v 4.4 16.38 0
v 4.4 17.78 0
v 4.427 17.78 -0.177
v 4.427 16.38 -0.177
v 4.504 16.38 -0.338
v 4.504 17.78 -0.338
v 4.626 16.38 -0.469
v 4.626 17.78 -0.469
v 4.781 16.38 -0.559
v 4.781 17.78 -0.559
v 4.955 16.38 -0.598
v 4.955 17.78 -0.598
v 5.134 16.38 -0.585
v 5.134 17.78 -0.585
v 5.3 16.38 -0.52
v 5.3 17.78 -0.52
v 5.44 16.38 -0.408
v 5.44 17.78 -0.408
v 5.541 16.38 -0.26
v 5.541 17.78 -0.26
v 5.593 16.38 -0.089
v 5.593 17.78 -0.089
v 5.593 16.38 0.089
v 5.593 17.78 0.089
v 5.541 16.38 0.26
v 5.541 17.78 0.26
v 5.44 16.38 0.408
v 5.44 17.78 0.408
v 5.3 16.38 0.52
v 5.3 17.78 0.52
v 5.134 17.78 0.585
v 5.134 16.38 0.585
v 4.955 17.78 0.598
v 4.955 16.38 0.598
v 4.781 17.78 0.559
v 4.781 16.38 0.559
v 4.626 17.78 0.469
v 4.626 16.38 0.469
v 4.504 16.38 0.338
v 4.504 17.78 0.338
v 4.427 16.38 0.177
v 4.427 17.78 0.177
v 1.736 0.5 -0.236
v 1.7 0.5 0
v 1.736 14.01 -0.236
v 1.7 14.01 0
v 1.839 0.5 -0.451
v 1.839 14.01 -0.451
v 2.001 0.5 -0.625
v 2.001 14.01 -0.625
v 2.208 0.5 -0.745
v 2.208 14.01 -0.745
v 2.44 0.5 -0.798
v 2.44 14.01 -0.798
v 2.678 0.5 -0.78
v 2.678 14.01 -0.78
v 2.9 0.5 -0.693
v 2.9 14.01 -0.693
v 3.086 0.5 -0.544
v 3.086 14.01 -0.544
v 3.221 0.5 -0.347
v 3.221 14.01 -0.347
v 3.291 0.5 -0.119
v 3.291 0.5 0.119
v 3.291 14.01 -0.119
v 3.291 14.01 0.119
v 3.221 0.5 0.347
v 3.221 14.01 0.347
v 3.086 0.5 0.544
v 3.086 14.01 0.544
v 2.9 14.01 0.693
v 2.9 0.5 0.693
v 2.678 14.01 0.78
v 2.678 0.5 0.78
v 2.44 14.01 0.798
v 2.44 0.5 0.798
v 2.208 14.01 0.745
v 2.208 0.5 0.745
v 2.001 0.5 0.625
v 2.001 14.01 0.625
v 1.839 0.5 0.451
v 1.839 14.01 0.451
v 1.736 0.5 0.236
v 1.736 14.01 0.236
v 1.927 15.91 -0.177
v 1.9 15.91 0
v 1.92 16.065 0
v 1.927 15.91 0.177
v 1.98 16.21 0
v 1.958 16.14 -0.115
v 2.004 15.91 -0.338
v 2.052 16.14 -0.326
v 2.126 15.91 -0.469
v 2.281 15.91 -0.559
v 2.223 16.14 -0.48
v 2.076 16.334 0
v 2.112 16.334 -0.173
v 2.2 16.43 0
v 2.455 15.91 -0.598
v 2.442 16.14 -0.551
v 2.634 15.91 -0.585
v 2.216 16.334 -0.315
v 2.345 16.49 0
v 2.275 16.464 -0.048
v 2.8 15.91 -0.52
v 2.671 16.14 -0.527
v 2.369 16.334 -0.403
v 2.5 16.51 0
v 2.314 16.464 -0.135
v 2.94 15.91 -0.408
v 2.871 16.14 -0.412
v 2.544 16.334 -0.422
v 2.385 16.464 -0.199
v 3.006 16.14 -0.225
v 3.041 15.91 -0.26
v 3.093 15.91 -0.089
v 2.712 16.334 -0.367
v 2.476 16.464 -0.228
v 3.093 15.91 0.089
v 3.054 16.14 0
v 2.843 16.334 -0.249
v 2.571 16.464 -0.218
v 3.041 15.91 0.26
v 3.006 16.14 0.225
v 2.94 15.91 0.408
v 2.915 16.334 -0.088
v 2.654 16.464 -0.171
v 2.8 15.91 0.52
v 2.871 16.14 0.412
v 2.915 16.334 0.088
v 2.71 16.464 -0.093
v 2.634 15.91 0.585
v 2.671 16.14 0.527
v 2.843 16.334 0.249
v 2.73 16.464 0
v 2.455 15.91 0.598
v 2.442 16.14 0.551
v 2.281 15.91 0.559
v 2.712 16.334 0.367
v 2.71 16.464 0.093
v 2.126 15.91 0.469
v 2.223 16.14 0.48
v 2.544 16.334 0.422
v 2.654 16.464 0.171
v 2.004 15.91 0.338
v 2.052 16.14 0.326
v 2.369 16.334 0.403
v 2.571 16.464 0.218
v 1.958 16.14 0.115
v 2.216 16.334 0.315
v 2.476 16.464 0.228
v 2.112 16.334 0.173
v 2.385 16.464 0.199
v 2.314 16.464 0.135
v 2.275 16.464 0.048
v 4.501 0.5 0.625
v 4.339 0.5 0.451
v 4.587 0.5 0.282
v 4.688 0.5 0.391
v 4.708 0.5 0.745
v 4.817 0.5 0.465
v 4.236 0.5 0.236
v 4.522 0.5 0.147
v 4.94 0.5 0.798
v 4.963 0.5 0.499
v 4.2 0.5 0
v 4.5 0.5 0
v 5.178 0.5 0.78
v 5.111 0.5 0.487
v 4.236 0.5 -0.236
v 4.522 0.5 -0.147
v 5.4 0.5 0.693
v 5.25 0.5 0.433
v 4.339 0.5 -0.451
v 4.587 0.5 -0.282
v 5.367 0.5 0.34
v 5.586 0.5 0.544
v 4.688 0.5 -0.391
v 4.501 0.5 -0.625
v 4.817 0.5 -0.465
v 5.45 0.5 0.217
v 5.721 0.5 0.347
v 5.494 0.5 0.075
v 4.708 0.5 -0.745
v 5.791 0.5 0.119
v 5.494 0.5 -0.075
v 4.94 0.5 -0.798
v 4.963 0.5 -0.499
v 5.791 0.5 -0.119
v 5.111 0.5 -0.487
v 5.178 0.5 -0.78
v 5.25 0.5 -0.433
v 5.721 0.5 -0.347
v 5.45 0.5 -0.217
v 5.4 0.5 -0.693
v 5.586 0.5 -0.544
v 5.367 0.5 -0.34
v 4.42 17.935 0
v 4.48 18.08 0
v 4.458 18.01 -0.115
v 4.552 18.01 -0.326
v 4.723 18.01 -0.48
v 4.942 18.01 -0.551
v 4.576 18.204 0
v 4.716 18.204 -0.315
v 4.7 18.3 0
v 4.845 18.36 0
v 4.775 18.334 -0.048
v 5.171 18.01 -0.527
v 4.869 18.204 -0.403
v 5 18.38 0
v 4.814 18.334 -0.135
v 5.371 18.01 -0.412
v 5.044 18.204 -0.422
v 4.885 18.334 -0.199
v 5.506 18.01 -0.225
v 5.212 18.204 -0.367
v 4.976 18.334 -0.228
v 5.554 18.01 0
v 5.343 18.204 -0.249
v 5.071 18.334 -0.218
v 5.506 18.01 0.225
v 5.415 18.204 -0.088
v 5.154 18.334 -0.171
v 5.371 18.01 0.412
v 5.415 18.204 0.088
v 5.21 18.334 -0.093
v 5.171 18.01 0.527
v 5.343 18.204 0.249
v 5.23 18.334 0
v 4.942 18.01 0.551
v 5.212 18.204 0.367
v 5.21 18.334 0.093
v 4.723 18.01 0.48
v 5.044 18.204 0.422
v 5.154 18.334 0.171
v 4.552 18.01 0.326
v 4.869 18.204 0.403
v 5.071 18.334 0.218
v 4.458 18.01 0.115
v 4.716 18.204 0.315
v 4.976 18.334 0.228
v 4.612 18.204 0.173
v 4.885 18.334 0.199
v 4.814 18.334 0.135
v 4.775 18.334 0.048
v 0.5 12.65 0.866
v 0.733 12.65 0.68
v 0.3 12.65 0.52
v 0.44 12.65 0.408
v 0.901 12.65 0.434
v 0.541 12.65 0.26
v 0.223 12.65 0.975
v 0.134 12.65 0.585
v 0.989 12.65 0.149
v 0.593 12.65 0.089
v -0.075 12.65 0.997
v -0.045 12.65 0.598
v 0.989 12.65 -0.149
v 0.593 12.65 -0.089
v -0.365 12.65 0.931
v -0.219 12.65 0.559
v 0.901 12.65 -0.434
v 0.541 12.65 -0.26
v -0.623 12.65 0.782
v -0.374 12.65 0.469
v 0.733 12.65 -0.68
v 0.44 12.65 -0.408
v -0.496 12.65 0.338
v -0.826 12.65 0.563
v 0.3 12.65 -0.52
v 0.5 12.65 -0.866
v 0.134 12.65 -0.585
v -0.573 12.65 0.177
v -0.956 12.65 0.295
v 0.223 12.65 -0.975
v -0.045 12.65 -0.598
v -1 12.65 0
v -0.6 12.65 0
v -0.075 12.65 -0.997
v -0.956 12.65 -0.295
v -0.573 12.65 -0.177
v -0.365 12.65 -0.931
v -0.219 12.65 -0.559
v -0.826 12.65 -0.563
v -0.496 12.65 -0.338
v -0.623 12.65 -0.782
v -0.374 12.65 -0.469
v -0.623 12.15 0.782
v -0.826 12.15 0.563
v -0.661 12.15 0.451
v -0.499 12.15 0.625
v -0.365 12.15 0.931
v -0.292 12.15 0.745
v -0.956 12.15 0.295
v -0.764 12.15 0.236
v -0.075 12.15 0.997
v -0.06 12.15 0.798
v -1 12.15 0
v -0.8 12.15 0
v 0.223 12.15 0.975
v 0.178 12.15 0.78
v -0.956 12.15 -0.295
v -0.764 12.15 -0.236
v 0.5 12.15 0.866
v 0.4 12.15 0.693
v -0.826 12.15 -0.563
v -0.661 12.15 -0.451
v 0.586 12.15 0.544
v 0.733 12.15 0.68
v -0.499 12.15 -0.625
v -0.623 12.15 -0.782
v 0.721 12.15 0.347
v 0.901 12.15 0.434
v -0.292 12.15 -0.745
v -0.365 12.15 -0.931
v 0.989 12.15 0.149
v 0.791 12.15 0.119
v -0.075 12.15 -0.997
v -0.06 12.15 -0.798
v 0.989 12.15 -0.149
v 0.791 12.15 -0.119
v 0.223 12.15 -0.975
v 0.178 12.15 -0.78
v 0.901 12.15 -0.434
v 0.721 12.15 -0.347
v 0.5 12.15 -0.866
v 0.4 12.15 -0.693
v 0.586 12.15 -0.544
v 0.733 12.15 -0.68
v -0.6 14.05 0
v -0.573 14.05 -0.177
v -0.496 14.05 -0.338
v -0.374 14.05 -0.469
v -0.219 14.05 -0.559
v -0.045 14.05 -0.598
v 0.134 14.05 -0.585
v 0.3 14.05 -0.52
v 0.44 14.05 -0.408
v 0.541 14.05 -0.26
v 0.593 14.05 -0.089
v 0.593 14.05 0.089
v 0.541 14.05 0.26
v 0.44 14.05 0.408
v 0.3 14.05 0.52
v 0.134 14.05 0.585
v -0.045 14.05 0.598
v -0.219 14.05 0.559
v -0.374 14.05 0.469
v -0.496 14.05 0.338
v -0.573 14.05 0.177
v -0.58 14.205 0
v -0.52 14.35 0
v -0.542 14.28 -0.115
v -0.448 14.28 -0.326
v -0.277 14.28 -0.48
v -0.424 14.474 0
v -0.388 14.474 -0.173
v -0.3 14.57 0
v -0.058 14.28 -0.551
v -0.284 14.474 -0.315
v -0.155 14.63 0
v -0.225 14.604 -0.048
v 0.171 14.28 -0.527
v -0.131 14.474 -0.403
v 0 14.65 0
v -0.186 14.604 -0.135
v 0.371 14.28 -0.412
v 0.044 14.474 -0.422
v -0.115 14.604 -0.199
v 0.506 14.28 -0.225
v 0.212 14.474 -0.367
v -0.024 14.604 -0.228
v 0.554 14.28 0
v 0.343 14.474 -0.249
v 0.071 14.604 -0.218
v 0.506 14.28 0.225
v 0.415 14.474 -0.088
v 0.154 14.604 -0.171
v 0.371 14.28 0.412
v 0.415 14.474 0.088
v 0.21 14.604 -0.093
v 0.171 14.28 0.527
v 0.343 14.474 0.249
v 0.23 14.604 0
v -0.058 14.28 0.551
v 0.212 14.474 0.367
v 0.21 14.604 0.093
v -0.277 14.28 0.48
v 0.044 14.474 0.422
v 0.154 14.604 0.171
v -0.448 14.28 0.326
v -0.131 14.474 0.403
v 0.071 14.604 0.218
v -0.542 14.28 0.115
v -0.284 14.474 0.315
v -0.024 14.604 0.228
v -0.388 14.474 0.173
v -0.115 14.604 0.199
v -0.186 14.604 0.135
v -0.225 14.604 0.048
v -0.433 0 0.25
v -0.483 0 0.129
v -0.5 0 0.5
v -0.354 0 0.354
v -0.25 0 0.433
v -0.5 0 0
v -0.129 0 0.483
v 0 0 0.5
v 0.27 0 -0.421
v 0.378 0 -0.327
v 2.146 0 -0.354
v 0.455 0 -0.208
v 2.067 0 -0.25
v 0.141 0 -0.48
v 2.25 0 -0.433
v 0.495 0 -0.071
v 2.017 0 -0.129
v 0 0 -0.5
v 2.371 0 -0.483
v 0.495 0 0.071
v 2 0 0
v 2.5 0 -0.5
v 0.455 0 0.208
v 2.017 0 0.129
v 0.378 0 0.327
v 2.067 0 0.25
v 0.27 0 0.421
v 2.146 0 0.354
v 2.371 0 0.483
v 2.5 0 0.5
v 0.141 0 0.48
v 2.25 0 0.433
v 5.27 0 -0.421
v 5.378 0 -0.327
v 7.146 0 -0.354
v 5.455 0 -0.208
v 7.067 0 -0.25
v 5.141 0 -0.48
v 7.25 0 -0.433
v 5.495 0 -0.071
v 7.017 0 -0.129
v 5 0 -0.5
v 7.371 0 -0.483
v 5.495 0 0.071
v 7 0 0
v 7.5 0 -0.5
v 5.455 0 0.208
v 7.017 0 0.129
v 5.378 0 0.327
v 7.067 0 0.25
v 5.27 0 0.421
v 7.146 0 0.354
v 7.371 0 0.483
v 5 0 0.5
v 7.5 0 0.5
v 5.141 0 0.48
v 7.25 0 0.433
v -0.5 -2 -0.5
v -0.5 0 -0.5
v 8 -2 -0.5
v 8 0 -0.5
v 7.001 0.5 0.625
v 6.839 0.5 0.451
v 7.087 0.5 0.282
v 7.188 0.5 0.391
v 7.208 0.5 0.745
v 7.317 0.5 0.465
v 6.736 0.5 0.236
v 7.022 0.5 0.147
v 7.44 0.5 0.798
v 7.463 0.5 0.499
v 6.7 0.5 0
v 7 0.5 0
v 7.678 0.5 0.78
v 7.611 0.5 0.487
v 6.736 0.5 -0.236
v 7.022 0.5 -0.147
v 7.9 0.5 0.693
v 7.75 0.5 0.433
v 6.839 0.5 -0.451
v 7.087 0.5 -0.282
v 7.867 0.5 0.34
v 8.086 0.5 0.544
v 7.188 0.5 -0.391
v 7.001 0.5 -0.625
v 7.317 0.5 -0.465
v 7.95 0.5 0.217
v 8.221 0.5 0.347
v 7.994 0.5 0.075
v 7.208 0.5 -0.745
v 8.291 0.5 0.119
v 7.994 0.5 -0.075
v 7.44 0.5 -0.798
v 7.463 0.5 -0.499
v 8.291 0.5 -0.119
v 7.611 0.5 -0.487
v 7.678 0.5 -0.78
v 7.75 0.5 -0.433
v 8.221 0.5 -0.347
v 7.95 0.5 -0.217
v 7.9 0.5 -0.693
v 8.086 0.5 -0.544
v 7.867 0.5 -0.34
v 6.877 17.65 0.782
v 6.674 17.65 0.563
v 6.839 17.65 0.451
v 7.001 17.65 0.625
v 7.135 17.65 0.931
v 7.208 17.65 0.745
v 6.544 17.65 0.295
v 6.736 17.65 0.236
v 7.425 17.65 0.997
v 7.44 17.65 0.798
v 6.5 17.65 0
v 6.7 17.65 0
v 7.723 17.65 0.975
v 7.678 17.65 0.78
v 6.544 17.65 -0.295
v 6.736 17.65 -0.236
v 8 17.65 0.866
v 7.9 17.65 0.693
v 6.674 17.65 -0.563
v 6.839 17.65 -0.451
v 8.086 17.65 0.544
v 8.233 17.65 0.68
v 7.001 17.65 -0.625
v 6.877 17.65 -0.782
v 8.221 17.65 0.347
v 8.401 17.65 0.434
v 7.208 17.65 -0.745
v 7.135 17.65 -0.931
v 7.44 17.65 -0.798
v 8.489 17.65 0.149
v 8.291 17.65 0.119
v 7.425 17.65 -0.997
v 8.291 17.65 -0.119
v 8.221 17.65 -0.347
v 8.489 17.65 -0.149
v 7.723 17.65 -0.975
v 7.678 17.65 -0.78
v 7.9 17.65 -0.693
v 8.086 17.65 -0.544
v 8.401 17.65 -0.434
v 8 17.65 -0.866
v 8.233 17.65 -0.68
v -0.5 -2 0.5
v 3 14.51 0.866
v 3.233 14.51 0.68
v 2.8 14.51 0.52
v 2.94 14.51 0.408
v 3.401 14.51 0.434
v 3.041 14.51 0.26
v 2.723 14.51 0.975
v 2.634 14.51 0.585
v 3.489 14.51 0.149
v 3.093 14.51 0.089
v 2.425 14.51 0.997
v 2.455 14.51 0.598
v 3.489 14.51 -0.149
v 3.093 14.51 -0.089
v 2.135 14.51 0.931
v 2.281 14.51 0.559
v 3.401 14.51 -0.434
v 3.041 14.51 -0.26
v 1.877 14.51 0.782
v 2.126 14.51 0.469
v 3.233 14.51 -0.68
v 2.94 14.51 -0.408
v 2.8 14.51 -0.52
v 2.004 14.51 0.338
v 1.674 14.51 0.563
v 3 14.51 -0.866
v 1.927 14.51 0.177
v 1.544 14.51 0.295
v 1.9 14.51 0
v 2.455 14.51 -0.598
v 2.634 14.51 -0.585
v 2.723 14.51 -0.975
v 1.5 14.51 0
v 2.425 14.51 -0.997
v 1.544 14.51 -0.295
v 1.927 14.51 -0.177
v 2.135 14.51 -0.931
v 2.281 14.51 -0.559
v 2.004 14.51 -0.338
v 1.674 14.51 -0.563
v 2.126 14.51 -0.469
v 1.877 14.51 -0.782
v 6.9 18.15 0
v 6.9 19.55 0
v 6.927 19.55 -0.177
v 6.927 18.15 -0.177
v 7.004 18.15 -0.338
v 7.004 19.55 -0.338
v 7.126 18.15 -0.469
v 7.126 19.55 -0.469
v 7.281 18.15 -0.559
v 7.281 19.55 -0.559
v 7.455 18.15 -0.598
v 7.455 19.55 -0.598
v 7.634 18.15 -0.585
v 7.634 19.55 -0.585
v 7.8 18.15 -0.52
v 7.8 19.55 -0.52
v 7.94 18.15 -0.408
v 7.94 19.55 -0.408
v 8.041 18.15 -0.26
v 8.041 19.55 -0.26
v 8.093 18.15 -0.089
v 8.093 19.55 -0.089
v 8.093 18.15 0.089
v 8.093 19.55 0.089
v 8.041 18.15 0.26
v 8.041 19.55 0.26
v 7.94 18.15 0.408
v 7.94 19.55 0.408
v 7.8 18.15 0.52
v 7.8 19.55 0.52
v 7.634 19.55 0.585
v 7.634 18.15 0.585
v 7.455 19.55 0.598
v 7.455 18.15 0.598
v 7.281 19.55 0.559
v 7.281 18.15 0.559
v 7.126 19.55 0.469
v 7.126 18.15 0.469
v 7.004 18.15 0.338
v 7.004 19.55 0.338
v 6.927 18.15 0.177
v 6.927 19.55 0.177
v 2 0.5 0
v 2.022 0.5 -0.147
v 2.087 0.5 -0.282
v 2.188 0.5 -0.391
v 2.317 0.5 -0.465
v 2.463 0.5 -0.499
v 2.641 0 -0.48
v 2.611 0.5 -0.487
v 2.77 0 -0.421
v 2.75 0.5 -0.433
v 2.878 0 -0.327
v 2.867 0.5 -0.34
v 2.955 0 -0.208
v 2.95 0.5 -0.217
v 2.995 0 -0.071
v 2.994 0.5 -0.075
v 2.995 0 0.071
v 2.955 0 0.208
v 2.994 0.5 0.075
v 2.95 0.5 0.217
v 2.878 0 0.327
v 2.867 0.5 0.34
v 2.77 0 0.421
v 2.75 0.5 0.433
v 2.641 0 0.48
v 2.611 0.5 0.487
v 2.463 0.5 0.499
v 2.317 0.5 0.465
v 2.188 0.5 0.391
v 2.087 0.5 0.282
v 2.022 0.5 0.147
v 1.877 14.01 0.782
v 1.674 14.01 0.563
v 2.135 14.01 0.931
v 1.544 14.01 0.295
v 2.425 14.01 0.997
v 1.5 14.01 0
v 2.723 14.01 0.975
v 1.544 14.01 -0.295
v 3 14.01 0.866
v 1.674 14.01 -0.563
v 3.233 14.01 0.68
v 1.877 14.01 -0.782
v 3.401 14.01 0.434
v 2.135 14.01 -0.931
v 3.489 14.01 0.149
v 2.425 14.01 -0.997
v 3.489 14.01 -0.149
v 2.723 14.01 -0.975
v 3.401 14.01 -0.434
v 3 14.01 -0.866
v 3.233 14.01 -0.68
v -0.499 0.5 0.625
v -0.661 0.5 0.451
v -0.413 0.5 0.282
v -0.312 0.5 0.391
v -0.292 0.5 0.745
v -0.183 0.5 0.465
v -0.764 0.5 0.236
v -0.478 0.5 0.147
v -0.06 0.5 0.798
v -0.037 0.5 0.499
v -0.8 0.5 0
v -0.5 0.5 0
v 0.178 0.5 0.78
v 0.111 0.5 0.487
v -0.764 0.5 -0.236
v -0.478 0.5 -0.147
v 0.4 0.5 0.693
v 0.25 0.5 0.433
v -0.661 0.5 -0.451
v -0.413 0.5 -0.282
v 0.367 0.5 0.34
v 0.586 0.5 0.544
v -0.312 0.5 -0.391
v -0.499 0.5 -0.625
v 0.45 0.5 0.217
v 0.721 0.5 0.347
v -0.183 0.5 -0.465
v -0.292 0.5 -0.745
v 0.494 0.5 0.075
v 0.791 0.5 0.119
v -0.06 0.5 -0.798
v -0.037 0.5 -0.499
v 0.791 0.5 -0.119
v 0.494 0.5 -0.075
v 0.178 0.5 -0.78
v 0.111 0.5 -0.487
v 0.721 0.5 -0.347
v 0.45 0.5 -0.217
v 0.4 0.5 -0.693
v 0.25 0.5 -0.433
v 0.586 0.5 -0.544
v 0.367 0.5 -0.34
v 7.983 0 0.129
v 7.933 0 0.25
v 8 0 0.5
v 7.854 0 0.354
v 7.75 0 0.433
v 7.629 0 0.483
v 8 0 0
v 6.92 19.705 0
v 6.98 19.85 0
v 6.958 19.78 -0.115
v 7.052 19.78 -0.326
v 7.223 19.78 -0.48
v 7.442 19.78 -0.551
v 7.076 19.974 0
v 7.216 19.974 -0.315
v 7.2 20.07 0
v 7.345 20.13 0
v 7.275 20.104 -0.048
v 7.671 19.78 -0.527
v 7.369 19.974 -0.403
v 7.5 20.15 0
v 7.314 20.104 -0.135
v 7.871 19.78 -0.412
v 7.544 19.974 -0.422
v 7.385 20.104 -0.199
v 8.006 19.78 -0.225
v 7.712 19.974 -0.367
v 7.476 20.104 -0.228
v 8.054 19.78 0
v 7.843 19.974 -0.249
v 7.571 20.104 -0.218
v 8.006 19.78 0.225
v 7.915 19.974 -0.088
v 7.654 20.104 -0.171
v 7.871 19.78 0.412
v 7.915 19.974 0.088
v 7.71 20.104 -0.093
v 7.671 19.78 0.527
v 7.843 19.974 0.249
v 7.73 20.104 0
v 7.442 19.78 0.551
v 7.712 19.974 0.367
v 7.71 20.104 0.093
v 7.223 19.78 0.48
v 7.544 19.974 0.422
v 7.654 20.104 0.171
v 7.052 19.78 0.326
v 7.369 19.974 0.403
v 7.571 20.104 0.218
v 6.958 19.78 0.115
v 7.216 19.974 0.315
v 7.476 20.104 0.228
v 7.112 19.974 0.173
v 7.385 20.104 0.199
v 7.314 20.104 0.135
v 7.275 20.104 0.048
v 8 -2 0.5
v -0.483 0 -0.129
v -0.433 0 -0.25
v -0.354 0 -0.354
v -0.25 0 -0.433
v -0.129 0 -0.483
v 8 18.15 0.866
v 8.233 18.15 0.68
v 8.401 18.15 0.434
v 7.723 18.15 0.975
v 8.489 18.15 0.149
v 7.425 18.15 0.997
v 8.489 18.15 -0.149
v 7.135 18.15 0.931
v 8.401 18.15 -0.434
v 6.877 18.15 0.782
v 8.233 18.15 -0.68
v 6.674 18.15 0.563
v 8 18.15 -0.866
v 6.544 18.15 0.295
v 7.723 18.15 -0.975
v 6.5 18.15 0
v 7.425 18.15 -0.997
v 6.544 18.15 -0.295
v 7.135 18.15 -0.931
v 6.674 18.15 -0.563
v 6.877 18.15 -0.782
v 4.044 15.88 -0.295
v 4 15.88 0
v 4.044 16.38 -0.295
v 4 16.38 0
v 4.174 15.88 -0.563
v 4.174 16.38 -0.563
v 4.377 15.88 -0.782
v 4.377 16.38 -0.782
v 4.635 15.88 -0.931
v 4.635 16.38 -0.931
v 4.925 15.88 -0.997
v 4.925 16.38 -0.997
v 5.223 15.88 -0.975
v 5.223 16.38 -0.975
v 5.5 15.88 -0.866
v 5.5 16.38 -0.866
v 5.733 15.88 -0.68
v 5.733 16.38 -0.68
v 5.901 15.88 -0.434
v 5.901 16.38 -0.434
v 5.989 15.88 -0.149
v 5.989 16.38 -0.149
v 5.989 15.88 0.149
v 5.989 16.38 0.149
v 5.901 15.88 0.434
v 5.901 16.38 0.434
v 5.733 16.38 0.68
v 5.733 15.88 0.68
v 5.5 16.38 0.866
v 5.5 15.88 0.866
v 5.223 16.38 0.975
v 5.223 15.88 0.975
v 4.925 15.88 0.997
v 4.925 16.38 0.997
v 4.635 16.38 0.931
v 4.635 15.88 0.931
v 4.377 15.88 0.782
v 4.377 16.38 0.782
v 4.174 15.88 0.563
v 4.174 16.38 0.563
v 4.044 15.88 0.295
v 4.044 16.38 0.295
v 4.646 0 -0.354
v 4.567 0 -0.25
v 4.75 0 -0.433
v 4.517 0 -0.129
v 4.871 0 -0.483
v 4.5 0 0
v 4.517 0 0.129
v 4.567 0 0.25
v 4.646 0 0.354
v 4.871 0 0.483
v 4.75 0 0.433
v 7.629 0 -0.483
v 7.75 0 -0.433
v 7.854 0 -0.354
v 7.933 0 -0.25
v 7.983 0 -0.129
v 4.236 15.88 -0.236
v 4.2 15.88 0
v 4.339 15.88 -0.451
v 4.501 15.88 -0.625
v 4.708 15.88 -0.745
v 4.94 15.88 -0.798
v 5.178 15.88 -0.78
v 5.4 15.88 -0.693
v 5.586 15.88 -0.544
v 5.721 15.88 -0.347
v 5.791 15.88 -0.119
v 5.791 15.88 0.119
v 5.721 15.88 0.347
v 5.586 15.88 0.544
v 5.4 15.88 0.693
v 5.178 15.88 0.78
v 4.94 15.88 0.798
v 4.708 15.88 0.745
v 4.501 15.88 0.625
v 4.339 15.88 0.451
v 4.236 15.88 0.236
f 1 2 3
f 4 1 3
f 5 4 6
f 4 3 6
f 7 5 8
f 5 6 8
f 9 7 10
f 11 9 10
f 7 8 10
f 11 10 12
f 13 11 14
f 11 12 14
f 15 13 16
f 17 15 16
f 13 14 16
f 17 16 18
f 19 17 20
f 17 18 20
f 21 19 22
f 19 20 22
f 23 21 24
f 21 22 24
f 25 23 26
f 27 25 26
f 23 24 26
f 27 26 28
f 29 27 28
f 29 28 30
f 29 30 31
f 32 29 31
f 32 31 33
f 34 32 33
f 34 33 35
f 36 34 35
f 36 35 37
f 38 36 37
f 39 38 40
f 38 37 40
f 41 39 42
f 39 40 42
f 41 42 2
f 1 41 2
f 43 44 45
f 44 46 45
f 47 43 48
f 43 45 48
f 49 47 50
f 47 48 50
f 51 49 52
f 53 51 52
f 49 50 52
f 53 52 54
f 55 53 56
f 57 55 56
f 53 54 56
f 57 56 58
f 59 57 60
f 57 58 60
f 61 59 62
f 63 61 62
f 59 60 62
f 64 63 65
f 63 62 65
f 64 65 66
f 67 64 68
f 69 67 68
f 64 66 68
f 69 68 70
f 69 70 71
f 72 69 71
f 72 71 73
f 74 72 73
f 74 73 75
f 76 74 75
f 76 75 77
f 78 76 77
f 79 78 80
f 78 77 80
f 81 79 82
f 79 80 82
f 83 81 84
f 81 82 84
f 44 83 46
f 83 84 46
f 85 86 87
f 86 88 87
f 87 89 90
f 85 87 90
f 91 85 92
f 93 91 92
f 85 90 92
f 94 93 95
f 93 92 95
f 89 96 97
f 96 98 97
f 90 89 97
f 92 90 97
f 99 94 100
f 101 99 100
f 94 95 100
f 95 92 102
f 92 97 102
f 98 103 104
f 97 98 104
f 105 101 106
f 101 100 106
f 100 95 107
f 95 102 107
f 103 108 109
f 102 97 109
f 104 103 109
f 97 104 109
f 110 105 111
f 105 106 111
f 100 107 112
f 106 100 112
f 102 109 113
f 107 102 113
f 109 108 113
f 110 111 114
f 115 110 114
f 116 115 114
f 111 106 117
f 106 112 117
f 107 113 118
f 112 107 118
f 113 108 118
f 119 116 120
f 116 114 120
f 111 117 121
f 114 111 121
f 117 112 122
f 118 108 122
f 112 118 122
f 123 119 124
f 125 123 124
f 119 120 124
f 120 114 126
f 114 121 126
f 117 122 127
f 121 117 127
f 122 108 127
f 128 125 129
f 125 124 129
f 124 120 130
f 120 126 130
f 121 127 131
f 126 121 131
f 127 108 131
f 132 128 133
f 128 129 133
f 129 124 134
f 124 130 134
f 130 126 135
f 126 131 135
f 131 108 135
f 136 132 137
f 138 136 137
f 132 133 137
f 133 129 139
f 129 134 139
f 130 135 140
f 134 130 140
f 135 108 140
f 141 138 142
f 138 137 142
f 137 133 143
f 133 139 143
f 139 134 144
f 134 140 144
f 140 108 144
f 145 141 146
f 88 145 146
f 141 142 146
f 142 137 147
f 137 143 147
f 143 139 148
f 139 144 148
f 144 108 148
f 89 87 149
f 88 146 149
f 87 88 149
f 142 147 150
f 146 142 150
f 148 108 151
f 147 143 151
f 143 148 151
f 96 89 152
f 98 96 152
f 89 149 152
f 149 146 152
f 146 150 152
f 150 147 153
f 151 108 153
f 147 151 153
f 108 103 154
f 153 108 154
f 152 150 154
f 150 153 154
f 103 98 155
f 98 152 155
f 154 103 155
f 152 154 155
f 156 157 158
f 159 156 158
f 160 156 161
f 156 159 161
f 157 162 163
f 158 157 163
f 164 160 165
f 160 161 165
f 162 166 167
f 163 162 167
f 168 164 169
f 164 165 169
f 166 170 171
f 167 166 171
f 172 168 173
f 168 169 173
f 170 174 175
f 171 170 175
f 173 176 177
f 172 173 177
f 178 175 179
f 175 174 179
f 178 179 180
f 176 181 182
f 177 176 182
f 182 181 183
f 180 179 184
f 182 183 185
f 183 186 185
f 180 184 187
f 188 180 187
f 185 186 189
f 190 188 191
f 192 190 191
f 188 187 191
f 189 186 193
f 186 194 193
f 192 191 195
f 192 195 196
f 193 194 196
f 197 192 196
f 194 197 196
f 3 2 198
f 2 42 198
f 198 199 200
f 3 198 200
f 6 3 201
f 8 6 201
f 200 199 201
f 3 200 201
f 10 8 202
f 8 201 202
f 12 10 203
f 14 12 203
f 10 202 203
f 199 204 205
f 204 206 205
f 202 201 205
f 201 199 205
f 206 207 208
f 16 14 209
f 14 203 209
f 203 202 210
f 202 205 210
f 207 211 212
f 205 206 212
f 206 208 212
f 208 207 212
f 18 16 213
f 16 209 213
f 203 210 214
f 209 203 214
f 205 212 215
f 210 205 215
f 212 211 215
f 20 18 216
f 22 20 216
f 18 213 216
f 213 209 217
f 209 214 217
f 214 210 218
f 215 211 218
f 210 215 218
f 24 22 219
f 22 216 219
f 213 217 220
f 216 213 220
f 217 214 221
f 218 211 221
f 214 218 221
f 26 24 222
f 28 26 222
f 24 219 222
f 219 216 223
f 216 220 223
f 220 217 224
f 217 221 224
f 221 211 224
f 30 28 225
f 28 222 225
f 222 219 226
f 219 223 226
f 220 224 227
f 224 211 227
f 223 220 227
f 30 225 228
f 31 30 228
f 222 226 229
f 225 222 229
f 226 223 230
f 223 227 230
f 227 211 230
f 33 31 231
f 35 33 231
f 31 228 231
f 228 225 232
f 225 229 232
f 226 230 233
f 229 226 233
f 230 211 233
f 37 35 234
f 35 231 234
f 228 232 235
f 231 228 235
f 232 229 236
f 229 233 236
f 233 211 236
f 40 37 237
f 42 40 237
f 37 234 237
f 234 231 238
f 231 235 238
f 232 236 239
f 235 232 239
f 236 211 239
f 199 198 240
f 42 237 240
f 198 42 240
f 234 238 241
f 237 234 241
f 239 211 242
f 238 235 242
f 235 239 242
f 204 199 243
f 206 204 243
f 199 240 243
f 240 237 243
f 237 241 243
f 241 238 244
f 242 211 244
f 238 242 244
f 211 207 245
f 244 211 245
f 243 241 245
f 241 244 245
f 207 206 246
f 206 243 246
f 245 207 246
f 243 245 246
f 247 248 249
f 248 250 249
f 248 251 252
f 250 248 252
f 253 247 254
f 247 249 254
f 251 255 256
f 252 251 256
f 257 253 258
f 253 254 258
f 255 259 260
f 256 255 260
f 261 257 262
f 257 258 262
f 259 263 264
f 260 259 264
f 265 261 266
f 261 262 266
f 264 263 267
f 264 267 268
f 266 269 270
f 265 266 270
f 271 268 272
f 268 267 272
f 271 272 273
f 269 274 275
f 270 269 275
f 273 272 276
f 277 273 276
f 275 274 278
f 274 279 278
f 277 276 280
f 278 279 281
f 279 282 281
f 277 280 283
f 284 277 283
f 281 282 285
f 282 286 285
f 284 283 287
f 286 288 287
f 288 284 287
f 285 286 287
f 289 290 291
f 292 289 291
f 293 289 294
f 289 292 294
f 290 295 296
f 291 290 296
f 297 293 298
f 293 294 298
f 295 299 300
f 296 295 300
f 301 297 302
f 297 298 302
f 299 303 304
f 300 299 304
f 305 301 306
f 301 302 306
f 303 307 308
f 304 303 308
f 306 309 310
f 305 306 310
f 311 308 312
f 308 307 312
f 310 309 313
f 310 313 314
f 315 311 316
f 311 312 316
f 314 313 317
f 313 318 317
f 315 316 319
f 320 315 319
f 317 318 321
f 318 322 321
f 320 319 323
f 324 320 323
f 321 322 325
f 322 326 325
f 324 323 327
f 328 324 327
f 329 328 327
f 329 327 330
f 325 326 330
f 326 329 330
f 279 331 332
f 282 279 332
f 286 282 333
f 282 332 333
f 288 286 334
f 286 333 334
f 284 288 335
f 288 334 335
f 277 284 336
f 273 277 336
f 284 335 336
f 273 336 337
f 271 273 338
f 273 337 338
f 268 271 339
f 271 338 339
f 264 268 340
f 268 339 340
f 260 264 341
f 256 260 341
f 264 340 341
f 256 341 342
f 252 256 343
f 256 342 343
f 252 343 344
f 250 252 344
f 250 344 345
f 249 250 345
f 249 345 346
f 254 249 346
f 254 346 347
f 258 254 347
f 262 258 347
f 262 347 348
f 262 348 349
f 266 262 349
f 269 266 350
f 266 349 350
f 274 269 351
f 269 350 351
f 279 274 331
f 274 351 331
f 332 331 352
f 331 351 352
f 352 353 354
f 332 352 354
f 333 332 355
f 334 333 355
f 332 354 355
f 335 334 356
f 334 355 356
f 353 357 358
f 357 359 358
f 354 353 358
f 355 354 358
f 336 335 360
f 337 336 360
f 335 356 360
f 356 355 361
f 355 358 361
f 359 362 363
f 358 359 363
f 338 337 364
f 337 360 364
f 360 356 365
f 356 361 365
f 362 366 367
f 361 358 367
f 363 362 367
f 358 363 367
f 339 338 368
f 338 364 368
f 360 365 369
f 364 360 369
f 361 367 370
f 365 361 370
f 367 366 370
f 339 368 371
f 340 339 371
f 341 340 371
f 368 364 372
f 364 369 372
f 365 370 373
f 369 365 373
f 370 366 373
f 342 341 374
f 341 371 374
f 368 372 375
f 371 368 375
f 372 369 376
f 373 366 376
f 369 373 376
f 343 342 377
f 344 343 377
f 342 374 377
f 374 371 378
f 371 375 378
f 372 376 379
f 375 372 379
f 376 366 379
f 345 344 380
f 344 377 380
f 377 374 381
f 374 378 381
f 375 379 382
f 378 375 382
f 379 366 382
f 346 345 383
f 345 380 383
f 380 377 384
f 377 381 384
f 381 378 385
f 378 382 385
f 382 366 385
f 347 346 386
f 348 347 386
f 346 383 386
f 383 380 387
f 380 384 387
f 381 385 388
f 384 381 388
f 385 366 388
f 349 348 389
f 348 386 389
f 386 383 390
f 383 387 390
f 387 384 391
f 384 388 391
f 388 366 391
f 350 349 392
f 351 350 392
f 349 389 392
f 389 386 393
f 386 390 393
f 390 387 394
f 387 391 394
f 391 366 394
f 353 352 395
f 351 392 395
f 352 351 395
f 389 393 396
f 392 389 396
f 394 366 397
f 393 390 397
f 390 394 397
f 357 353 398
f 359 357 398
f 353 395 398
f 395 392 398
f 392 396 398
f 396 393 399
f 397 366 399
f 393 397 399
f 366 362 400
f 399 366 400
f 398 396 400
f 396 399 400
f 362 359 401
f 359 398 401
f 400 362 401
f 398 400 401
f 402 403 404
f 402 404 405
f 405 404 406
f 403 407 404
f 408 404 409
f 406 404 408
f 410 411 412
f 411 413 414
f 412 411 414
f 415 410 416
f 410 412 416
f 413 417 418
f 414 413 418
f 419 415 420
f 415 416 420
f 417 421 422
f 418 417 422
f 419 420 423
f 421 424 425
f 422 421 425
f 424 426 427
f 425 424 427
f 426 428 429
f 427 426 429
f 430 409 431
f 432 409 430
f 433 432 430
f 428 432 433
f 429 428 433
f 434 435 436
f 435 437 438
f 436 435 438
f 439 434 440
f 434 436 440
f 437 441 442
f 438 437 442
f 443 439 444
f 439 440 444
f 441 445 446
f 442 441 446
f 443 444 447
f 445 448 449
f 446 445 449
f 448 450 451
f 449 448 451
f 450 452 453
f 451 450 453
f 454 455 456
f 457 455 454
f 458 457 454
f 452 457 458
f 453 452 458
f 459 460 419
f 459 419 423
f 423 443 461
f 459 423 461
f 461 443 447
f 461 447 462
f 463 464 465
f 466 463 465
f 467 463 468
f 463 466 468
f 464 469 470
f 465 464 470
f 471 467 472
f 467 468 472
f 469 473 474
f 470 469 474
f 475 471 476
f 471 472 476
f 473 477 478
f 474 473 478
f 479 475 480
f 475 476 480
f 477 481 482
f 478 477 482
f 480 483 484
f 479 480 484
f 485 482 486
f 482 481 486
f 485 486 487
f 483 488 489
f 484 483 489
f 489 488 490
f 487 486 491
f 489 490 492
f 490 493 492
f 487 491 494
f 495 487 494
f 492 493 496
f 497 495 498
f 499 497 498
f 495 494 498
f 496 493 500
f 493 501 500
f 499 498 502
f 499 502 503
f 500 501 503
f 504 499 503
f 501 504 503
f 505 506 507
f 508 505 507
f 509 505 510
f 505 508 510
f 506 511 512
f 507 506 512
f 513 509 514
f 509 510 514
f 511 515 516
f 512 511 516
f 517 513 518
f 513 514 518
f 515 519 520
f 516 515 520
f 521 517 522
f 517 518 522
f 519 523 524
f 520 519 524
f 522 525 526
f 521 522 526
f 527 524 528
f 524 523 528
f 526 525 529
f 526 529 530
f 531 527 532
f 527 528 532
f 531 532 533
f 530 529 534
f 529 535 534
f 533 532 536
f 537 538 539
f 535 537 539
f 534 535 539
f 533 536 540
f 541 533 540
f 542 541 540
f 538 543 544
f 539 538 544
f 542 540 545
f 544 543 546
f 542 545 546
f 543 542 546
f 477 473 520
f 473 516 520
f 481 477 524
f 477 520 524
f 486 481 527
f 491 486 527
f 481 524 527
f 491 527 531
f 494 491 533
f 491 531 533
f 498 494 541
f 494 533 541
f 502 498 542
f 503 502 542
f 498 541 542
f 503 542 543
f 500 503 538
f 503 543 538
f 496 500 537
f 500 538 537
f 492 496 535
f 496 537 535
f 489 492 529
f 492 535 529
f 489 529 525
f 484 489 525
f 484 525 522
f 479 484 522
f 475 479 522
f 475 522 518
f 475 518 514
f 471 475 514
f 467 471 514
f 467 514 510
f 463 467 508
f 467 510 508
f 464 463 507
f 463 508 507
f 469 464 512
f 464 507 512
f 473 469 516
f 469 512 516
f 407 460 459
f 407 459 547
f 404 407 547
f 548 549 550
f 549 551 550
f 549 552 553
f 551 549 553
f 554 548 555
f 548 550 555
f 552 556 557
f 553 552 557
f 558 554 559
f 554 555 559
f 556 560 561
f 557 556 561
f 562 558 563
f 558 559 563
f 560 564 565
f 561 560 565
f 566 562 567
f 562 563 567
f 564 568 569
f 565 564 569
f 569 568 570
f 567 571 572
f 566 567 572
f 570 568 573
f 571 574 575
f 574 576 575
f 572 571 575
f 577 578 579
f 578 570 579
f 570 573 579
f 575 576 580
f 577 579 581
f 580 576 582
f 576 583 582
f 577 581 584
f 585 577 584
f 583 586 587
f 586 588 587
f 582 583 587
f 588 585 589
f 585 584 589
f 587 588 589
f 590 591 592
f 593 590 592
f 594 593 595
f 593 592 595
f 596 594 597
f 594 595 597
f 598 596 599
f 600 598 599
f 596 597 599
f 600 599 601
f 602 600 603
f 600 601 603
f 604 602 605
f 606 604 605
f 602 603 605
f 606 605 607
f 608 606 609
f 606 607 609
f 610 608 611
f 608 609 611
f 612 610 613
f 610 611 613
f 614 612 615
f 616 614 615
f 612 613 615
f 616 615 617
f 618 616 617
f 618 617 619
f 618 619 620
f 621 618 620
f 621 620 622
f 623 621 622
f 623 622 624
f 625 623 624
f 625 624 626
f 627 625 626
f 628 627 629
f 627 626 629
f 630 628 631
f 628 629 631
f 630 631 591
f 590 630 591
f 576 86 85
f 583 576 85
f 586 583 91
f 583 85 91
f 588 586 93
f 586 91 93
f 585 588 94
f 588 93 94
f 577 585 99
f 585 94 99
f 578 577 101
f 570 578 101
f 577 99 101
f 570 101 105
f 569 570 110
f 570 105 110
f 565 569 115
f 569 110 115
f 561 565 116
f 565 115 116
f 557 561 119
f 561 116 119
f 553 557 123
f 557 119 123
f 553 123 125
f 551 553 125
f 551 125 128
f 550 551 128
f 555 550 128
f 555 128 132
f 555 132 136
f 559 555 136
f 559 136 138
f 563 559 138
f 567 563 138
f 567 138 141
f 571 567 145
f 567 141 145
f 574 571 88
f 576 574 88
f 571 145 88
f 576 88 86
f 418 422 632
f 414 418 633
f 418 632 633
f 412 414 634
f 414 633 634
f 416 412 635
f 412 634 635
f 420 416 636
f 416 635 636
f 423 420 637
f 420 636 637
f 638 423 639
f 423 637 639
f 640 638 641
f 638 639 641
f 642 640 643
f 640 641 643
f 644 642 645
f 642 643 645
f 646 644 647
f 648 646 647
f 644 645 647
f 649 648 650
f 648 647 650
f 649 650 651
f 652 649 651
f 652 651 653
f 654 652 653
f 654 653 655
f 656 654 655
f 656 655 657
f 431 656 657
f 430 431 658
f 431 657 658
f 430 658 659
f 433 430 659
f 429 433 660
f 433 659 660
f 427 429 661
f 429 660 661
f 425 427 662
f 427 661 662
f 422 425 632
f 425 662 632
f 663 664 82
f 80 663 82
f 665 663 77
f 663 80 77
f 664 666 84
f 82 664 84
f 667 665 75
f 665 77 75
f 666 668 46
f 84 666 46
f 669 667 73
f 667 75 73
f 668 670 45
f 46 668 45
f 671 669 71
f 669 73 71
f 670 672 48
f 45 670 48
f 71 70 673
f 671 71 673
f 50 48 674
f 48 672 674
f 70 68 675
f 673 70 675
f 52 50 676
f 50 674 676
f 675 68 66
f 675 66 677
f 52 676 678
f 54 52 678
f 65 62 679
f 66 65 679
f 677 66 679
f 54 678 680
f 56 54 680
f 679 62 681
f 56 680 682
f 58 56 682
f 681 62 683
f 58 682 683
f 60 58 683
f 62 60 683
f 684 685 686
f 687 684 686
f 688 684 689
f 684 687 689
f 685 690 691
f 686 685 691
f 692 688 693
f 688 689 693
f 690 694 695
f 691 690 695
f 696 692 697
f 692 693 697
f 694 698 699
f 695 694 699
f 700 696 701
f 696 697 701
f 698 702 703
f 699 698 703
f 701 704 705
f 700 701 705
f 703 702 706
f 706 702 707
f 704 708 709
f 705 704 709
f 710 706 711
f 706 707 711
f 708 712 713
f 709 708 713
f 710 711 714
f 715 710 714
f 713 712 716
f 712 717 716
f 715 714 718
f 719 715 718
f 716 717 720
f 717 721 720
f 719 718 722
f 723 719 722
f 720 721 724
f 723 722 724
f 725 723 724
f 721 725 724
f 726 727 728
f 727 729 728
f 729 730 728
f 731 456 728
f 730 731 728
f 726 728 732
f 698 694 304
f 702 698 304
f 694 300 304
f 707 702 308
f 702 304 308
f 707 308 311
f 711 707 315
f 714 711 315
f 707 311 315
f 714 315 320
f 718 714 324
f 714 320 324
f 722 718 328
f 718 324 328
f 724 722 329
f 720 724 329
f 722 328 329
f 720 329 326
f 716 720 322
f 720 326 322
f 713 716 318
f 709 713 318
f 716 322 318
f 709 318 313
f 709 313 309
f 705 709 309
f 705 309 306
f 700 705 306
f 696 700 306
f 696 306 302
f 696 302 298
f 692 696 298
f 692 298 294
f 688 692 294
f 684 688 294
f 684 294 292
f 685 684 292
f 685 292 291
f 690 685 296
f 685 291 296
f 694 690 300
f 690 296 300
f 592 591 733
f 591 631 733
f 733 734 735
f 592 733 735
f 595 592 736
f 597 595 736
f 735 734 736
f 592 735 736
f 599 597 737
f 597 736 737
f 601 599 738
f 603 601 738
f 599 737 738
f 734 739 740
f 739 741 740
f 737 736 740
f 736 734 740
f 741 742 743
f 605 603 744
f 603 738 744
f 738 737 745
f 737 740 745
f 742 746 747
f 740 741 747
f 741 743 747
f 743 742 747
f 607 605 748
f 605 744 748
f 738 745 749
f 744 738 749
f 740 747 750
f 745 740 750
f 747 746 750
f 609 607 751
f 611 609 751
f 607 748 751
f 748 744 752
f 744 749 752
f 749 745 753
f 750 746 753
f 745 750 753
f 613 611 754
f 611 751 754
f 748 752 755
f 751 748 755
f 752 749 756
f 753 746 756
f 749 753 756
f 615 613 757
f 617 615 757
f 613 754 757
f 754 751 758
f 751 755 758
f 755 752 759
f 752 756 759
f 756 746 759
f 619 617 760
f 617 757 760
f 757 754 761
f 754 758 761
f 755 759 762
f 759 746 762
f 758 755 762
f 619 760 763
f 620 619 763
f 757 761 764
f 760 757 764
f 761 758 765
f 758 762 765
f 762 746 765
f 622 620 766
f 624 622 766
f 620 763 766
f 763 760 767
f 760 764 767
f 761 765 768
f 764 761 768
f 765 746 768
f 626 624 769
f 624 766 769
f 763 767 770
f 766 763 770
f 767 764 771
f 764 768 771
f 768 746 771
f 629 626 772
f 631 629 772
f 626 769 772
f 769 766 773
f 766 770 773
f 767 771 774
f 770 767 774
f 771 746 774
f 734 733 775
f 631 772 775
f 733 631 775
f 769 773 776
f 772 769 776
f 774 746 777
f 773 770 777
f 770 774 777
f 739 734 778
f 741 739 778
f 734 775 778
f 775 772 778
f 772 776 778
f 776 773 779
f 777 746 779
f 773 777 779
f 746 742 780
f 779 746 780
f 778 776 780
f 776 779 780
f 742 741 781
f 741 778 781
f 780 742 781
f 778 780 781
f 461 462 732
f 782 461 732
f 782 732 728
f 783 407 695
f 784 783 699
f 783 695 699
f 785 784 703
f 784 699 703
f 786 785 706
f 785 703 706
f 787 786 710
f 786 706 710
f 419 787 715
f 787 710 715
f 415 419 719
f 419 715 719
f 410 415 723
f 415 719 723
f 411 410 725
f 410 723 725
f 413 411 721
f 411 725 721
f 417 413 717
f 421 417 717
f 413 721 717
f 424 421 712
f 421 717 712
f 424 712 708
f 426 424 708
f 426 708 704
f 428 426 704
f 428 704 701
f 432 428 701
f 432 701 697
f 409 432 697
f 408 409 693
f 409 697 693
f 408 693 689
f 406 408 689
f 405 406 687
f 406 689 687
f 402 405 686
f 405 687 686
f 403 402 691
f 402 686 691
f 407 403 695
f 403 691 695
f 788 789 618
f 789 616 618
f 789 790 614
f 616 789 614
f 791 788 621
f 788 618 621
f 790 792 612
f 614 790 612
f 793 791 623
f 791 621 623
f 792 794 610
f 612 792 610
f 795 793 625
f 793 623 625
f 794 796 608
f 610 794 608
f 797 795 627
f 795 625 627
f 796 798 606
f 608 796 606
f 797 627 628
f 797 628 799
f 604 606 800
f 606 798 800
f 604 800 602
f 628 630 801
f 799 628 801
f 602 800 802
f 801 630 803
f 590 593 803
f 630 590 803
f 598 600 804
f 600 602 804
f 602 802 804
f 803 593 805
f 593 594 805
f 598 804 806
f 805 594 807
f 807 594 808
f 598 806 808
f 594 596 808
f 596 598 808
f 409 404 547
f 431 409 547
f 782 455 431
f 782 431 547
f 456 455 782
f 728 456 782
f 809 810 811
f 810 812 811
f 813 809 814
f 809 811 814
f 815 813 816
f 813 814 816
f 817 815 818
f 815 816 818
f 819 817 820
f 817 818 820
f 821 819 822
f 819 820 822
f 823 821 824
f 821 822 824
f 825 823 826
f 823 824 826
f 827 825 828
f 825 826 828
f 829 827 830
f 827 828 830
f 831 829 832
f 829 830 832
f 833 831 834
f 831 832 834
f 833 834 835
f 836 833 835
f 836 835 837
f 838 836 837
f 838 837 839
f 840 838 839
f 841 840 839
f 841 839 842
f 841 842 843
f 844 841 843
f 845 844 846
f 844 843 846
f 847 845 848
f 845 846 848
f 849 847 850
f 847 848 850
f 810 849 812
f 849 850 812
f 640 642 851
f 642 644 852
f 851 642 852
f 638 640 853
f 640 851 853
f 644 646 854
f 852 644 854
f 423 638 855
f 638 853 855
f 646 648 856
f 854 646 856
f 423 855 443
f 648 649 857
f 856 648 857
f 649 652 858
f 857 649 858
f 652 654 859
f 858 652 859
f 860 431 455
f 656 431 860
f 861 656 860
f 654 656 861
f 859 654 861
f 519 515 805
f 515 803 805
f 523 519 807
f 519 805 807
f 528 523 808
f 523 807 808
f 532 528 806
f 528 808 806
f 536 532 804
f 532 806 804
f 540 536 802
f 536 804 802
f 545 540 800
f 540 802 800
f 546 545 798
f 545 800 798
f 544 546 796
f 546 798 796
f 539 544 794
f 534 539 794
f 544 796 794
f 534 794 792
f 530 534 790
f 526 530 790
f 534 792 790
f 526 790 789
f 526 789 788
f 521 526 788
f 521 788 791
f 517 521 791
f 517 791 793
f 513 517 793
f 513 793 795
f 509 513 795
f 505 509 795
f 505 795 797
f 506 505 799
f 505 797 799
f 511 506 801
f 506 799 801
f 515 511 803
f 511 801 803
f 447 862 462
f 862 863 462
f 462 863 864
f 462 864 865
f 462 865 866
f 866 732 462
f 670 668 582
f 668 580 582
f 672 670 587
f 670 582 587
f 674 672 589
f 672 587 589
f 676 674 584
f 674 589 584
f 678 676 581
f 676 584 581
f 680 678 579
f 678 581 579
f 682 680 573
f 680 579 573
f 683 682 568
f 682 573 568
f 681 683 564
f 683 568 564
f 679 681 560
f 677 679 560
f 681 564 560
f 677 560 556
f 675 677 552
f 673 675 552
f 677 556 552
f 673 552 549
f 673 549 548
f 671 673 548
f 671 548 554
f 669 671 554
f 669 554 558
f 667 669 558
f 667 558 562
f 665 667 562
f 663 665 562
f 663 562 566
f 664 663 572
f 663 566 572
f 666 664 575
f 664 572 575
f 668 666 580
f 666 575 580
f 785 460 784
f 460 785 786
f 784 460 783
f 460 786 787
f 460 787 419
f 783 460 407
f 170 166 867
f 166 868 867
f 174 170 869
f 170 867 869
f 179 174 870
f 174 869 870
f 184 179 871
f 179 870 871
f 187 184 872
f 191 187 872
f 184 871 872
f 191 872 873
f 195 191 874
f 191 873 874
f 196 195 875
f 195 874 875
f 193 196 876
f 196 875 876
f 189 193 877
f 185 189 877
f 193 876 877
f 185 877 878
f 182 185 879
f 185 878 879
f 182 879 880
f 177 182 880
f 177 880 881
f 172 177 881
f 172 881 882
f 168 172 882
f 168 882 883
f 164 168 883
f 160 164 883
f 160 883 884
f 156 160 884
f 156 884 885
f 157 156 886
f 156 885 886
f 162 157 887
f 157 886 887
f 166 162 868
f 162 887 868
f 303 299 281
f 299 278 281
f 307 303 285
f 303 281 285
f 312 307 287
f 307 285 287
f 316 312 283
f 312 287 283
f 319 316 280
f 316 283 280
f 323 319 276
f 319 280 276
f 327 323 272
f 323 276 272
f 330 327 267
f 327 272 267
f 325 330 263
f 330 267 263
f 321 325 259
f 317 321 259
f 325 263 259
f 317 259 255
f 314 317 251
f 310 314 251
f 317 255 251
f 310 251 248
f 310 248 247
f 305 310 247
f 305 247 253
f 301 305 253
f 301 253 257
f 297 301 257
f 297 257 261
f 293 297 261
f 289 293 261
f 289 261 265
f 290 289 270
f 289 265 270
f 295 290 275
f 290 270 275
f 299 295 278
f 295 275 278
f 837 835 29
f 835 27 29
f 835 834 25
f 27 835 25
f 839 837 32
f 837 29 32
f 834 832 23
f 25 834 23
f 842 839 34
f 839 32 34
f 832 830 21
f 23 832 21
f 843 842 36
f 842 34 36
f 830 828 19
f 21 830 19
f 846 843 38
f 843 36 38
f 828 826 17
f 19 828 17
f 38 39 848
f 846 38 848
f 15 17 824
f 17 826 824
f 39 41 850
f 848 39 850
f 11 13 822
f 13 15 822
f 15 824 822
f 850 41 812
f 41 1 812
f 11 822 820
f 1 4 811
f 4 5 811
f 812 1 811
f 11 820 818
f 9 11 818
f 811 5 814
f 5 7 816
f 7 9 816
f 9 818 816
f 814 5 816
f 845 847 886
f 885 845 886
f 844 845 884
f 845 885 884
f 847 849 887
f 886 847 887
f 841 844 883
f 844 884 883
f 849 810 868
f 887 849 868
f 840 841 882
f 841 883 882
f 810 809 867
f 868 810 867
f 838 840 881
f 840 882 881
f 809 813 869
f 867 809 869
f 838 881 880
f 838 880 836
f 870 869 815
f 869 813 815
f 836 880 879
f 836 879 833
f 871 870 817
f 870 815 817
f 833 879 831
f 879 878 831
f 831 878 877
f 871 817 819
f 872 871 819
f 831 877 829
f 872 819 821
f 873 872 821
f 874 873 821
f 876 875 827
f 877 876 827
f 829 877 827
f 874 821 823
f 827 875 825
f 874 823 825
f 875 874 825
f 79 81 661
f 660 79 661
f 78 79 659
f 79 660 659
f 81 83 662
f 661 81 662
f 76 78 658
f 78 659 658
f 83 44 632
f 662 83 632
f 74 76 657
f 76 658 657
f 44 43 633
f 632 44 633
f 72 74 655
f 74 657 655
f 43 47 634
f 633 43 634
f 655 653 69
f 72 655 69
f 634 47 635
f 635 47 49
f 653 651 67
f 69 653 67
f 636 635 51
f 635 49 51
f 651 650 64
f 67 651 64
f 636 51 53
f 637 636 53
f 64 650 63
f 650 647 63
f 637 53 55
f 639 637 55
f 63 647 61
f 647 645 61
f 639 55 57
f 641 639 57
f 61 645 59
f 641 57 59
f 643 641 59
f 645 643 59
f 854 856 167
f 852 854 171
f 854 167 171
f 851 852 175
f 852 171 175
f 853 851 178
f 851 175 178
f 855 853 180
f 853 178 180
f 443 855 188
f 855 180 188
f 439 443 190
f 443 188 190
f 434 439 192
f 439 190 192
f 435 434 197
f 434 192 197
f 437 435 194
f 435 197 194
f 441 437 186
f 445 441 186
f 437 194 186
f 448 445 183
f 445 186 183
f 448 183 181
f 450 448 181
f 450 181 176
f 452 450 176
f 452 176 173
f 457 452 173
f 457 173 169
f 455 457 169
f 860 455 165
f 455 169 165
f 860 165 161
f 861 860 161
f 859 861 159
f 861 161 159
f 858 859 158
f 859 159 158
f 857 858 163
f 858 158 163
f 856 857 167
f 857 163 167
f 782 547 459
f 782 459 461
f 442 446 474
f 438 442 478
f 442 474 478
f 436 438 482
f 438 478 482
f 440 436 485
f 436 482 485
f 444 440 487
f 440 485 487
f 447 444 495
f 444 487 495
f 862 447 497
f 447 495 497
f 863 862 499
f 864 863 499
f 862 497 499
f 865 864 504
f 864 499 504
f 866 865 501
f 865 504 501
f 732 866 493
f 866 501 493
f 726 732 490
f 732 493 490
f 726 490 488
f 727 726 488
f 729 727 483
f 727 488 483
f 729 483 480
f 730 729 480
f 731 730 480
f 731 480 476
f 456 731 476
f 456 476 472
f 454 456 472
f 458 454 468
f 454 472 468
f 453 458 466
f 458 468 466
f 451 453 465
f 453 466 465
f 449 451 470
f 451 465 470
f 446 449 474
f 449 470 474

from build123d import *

# Parameters (mm, degrees)
FILLET2_R           = 0.6
FILLET3_R           = 0.6
FILLET4_R           = 0.6
FILLET5_R           = 0.6
SKETCH14_W          = 8.5
SKETCH14_H          = 1
BOSS_EXTRUDE1_DEPTH = 2


with BuildPart() as part:
    # Sketch10 → Revolve1 (revolve)
    with BuildSketch(Plane.XY):
        Polygon((0, 0), (-0.5, 0), (-0.5, 0.5), (-0.8, 0.5), (-0.8, 12.15), (-1, 12.15), (-1, 12.65), (-0.6, 12.65), (-0.6, 14.65), (0, 14.65), align=None)
    revolve(axis=Axis((0, 14.65, 0), (0, -1, 0)))

    # Fillet2
    fillet2_edges = [part.edges().sort_by_distance(p)[0] for p in [
        (0.6, 14.65, 0),
    ]]
    fillet(fillet2_edges, radius=FILLET2_R)



with BuildPart() as body_2:
    # Sketch11 → Revolve2 (revolve)
    with BuildSketch(Plane.XY):
        Polygon((2.5, 0), (2, 0), (2, 0.5), (1.7, 0.5), (1.7, 14.01), (1.5, 14.01), (1.5, 14.51), (1.9, 14.51), (1.9, 16.51), (2.5, 16.51), align=None)
    revolve(axis=Axis((2.5, 16.51, 0), (0, -1, 0)))

    # Fillet3
    fillet3_edges = [body_2.edges().sort_by_distance(p)[0] for p in [
        (3.1, 16.51, 0),
    ]]
    fillet(fillet3_edges, radius=FILLET3_R)


with BuildPart() as body_3:
    # Sketch12 → Revolve3 (revolve)
    with BuildSketch(Plane.XY):
        Polygon((5, 0), (4.5, 0), (4.5, 0.5), (4.2, 0.5), (4.2, 15.88), (4, 15.88), (4, 16.38), (4.4, 16.38), (4.4, 18.38), (5, 18.38), align=None)
    revolve(axis=Axis((5, 18.38, 0), (0, -1, 0)))

    # Fillet4
    fillet4_edges = [body_3.edges().sort_by_distance(p)[0] for p in [
        (5.6, 18.38, 0),
    ]]
    fillet(fillet4_edges, radius=FILLET4_R)


with BuildPart() as body_4:
    # Sketch13 → Revolve4 (revolve)
    with BuildSketch(Plane.XY):
        Polygon((7.5, 0), (7, 0), (7, 0.5), (6.7, 0.5), (6.7, 17.65), (6.5, 17.65), (6.5, 18.15), (6.9, 18.15), (6.9, 20.15), (7.5, 20.15), align=None)
    revolve(axis=Axis((7.5, 20.15, 0), (0, -1, 0)))

    # Fillet5
    fillet5_edges = [body_4.edges().sort_by_distance(p)[0] for p in [
        (8.1, 20.15, 0),
    ]]
    fillet(fillet5_edges, radius=FILLET5_R)


with BuildPart() as part_1:
    add(part.part)

    add(body_2.part)  # Boss-Extrude1 merges body 2

    add(body_3.part)  # Boss-Extrude1 merges body 3

    add(body_4.part)  # Boss-Extrude1 merges body 4
    # Sketch14 → Boss-Extrude1 (add)
    with BuildSketch(Plane.XZ):
        with Locations((3.75, 0)):
            Rectangle(SKETCH14_W, SKETCH14_H)
    extrude(amount=BOSS_EXTRUDE1_DEPTH)


solid = part_1.part
